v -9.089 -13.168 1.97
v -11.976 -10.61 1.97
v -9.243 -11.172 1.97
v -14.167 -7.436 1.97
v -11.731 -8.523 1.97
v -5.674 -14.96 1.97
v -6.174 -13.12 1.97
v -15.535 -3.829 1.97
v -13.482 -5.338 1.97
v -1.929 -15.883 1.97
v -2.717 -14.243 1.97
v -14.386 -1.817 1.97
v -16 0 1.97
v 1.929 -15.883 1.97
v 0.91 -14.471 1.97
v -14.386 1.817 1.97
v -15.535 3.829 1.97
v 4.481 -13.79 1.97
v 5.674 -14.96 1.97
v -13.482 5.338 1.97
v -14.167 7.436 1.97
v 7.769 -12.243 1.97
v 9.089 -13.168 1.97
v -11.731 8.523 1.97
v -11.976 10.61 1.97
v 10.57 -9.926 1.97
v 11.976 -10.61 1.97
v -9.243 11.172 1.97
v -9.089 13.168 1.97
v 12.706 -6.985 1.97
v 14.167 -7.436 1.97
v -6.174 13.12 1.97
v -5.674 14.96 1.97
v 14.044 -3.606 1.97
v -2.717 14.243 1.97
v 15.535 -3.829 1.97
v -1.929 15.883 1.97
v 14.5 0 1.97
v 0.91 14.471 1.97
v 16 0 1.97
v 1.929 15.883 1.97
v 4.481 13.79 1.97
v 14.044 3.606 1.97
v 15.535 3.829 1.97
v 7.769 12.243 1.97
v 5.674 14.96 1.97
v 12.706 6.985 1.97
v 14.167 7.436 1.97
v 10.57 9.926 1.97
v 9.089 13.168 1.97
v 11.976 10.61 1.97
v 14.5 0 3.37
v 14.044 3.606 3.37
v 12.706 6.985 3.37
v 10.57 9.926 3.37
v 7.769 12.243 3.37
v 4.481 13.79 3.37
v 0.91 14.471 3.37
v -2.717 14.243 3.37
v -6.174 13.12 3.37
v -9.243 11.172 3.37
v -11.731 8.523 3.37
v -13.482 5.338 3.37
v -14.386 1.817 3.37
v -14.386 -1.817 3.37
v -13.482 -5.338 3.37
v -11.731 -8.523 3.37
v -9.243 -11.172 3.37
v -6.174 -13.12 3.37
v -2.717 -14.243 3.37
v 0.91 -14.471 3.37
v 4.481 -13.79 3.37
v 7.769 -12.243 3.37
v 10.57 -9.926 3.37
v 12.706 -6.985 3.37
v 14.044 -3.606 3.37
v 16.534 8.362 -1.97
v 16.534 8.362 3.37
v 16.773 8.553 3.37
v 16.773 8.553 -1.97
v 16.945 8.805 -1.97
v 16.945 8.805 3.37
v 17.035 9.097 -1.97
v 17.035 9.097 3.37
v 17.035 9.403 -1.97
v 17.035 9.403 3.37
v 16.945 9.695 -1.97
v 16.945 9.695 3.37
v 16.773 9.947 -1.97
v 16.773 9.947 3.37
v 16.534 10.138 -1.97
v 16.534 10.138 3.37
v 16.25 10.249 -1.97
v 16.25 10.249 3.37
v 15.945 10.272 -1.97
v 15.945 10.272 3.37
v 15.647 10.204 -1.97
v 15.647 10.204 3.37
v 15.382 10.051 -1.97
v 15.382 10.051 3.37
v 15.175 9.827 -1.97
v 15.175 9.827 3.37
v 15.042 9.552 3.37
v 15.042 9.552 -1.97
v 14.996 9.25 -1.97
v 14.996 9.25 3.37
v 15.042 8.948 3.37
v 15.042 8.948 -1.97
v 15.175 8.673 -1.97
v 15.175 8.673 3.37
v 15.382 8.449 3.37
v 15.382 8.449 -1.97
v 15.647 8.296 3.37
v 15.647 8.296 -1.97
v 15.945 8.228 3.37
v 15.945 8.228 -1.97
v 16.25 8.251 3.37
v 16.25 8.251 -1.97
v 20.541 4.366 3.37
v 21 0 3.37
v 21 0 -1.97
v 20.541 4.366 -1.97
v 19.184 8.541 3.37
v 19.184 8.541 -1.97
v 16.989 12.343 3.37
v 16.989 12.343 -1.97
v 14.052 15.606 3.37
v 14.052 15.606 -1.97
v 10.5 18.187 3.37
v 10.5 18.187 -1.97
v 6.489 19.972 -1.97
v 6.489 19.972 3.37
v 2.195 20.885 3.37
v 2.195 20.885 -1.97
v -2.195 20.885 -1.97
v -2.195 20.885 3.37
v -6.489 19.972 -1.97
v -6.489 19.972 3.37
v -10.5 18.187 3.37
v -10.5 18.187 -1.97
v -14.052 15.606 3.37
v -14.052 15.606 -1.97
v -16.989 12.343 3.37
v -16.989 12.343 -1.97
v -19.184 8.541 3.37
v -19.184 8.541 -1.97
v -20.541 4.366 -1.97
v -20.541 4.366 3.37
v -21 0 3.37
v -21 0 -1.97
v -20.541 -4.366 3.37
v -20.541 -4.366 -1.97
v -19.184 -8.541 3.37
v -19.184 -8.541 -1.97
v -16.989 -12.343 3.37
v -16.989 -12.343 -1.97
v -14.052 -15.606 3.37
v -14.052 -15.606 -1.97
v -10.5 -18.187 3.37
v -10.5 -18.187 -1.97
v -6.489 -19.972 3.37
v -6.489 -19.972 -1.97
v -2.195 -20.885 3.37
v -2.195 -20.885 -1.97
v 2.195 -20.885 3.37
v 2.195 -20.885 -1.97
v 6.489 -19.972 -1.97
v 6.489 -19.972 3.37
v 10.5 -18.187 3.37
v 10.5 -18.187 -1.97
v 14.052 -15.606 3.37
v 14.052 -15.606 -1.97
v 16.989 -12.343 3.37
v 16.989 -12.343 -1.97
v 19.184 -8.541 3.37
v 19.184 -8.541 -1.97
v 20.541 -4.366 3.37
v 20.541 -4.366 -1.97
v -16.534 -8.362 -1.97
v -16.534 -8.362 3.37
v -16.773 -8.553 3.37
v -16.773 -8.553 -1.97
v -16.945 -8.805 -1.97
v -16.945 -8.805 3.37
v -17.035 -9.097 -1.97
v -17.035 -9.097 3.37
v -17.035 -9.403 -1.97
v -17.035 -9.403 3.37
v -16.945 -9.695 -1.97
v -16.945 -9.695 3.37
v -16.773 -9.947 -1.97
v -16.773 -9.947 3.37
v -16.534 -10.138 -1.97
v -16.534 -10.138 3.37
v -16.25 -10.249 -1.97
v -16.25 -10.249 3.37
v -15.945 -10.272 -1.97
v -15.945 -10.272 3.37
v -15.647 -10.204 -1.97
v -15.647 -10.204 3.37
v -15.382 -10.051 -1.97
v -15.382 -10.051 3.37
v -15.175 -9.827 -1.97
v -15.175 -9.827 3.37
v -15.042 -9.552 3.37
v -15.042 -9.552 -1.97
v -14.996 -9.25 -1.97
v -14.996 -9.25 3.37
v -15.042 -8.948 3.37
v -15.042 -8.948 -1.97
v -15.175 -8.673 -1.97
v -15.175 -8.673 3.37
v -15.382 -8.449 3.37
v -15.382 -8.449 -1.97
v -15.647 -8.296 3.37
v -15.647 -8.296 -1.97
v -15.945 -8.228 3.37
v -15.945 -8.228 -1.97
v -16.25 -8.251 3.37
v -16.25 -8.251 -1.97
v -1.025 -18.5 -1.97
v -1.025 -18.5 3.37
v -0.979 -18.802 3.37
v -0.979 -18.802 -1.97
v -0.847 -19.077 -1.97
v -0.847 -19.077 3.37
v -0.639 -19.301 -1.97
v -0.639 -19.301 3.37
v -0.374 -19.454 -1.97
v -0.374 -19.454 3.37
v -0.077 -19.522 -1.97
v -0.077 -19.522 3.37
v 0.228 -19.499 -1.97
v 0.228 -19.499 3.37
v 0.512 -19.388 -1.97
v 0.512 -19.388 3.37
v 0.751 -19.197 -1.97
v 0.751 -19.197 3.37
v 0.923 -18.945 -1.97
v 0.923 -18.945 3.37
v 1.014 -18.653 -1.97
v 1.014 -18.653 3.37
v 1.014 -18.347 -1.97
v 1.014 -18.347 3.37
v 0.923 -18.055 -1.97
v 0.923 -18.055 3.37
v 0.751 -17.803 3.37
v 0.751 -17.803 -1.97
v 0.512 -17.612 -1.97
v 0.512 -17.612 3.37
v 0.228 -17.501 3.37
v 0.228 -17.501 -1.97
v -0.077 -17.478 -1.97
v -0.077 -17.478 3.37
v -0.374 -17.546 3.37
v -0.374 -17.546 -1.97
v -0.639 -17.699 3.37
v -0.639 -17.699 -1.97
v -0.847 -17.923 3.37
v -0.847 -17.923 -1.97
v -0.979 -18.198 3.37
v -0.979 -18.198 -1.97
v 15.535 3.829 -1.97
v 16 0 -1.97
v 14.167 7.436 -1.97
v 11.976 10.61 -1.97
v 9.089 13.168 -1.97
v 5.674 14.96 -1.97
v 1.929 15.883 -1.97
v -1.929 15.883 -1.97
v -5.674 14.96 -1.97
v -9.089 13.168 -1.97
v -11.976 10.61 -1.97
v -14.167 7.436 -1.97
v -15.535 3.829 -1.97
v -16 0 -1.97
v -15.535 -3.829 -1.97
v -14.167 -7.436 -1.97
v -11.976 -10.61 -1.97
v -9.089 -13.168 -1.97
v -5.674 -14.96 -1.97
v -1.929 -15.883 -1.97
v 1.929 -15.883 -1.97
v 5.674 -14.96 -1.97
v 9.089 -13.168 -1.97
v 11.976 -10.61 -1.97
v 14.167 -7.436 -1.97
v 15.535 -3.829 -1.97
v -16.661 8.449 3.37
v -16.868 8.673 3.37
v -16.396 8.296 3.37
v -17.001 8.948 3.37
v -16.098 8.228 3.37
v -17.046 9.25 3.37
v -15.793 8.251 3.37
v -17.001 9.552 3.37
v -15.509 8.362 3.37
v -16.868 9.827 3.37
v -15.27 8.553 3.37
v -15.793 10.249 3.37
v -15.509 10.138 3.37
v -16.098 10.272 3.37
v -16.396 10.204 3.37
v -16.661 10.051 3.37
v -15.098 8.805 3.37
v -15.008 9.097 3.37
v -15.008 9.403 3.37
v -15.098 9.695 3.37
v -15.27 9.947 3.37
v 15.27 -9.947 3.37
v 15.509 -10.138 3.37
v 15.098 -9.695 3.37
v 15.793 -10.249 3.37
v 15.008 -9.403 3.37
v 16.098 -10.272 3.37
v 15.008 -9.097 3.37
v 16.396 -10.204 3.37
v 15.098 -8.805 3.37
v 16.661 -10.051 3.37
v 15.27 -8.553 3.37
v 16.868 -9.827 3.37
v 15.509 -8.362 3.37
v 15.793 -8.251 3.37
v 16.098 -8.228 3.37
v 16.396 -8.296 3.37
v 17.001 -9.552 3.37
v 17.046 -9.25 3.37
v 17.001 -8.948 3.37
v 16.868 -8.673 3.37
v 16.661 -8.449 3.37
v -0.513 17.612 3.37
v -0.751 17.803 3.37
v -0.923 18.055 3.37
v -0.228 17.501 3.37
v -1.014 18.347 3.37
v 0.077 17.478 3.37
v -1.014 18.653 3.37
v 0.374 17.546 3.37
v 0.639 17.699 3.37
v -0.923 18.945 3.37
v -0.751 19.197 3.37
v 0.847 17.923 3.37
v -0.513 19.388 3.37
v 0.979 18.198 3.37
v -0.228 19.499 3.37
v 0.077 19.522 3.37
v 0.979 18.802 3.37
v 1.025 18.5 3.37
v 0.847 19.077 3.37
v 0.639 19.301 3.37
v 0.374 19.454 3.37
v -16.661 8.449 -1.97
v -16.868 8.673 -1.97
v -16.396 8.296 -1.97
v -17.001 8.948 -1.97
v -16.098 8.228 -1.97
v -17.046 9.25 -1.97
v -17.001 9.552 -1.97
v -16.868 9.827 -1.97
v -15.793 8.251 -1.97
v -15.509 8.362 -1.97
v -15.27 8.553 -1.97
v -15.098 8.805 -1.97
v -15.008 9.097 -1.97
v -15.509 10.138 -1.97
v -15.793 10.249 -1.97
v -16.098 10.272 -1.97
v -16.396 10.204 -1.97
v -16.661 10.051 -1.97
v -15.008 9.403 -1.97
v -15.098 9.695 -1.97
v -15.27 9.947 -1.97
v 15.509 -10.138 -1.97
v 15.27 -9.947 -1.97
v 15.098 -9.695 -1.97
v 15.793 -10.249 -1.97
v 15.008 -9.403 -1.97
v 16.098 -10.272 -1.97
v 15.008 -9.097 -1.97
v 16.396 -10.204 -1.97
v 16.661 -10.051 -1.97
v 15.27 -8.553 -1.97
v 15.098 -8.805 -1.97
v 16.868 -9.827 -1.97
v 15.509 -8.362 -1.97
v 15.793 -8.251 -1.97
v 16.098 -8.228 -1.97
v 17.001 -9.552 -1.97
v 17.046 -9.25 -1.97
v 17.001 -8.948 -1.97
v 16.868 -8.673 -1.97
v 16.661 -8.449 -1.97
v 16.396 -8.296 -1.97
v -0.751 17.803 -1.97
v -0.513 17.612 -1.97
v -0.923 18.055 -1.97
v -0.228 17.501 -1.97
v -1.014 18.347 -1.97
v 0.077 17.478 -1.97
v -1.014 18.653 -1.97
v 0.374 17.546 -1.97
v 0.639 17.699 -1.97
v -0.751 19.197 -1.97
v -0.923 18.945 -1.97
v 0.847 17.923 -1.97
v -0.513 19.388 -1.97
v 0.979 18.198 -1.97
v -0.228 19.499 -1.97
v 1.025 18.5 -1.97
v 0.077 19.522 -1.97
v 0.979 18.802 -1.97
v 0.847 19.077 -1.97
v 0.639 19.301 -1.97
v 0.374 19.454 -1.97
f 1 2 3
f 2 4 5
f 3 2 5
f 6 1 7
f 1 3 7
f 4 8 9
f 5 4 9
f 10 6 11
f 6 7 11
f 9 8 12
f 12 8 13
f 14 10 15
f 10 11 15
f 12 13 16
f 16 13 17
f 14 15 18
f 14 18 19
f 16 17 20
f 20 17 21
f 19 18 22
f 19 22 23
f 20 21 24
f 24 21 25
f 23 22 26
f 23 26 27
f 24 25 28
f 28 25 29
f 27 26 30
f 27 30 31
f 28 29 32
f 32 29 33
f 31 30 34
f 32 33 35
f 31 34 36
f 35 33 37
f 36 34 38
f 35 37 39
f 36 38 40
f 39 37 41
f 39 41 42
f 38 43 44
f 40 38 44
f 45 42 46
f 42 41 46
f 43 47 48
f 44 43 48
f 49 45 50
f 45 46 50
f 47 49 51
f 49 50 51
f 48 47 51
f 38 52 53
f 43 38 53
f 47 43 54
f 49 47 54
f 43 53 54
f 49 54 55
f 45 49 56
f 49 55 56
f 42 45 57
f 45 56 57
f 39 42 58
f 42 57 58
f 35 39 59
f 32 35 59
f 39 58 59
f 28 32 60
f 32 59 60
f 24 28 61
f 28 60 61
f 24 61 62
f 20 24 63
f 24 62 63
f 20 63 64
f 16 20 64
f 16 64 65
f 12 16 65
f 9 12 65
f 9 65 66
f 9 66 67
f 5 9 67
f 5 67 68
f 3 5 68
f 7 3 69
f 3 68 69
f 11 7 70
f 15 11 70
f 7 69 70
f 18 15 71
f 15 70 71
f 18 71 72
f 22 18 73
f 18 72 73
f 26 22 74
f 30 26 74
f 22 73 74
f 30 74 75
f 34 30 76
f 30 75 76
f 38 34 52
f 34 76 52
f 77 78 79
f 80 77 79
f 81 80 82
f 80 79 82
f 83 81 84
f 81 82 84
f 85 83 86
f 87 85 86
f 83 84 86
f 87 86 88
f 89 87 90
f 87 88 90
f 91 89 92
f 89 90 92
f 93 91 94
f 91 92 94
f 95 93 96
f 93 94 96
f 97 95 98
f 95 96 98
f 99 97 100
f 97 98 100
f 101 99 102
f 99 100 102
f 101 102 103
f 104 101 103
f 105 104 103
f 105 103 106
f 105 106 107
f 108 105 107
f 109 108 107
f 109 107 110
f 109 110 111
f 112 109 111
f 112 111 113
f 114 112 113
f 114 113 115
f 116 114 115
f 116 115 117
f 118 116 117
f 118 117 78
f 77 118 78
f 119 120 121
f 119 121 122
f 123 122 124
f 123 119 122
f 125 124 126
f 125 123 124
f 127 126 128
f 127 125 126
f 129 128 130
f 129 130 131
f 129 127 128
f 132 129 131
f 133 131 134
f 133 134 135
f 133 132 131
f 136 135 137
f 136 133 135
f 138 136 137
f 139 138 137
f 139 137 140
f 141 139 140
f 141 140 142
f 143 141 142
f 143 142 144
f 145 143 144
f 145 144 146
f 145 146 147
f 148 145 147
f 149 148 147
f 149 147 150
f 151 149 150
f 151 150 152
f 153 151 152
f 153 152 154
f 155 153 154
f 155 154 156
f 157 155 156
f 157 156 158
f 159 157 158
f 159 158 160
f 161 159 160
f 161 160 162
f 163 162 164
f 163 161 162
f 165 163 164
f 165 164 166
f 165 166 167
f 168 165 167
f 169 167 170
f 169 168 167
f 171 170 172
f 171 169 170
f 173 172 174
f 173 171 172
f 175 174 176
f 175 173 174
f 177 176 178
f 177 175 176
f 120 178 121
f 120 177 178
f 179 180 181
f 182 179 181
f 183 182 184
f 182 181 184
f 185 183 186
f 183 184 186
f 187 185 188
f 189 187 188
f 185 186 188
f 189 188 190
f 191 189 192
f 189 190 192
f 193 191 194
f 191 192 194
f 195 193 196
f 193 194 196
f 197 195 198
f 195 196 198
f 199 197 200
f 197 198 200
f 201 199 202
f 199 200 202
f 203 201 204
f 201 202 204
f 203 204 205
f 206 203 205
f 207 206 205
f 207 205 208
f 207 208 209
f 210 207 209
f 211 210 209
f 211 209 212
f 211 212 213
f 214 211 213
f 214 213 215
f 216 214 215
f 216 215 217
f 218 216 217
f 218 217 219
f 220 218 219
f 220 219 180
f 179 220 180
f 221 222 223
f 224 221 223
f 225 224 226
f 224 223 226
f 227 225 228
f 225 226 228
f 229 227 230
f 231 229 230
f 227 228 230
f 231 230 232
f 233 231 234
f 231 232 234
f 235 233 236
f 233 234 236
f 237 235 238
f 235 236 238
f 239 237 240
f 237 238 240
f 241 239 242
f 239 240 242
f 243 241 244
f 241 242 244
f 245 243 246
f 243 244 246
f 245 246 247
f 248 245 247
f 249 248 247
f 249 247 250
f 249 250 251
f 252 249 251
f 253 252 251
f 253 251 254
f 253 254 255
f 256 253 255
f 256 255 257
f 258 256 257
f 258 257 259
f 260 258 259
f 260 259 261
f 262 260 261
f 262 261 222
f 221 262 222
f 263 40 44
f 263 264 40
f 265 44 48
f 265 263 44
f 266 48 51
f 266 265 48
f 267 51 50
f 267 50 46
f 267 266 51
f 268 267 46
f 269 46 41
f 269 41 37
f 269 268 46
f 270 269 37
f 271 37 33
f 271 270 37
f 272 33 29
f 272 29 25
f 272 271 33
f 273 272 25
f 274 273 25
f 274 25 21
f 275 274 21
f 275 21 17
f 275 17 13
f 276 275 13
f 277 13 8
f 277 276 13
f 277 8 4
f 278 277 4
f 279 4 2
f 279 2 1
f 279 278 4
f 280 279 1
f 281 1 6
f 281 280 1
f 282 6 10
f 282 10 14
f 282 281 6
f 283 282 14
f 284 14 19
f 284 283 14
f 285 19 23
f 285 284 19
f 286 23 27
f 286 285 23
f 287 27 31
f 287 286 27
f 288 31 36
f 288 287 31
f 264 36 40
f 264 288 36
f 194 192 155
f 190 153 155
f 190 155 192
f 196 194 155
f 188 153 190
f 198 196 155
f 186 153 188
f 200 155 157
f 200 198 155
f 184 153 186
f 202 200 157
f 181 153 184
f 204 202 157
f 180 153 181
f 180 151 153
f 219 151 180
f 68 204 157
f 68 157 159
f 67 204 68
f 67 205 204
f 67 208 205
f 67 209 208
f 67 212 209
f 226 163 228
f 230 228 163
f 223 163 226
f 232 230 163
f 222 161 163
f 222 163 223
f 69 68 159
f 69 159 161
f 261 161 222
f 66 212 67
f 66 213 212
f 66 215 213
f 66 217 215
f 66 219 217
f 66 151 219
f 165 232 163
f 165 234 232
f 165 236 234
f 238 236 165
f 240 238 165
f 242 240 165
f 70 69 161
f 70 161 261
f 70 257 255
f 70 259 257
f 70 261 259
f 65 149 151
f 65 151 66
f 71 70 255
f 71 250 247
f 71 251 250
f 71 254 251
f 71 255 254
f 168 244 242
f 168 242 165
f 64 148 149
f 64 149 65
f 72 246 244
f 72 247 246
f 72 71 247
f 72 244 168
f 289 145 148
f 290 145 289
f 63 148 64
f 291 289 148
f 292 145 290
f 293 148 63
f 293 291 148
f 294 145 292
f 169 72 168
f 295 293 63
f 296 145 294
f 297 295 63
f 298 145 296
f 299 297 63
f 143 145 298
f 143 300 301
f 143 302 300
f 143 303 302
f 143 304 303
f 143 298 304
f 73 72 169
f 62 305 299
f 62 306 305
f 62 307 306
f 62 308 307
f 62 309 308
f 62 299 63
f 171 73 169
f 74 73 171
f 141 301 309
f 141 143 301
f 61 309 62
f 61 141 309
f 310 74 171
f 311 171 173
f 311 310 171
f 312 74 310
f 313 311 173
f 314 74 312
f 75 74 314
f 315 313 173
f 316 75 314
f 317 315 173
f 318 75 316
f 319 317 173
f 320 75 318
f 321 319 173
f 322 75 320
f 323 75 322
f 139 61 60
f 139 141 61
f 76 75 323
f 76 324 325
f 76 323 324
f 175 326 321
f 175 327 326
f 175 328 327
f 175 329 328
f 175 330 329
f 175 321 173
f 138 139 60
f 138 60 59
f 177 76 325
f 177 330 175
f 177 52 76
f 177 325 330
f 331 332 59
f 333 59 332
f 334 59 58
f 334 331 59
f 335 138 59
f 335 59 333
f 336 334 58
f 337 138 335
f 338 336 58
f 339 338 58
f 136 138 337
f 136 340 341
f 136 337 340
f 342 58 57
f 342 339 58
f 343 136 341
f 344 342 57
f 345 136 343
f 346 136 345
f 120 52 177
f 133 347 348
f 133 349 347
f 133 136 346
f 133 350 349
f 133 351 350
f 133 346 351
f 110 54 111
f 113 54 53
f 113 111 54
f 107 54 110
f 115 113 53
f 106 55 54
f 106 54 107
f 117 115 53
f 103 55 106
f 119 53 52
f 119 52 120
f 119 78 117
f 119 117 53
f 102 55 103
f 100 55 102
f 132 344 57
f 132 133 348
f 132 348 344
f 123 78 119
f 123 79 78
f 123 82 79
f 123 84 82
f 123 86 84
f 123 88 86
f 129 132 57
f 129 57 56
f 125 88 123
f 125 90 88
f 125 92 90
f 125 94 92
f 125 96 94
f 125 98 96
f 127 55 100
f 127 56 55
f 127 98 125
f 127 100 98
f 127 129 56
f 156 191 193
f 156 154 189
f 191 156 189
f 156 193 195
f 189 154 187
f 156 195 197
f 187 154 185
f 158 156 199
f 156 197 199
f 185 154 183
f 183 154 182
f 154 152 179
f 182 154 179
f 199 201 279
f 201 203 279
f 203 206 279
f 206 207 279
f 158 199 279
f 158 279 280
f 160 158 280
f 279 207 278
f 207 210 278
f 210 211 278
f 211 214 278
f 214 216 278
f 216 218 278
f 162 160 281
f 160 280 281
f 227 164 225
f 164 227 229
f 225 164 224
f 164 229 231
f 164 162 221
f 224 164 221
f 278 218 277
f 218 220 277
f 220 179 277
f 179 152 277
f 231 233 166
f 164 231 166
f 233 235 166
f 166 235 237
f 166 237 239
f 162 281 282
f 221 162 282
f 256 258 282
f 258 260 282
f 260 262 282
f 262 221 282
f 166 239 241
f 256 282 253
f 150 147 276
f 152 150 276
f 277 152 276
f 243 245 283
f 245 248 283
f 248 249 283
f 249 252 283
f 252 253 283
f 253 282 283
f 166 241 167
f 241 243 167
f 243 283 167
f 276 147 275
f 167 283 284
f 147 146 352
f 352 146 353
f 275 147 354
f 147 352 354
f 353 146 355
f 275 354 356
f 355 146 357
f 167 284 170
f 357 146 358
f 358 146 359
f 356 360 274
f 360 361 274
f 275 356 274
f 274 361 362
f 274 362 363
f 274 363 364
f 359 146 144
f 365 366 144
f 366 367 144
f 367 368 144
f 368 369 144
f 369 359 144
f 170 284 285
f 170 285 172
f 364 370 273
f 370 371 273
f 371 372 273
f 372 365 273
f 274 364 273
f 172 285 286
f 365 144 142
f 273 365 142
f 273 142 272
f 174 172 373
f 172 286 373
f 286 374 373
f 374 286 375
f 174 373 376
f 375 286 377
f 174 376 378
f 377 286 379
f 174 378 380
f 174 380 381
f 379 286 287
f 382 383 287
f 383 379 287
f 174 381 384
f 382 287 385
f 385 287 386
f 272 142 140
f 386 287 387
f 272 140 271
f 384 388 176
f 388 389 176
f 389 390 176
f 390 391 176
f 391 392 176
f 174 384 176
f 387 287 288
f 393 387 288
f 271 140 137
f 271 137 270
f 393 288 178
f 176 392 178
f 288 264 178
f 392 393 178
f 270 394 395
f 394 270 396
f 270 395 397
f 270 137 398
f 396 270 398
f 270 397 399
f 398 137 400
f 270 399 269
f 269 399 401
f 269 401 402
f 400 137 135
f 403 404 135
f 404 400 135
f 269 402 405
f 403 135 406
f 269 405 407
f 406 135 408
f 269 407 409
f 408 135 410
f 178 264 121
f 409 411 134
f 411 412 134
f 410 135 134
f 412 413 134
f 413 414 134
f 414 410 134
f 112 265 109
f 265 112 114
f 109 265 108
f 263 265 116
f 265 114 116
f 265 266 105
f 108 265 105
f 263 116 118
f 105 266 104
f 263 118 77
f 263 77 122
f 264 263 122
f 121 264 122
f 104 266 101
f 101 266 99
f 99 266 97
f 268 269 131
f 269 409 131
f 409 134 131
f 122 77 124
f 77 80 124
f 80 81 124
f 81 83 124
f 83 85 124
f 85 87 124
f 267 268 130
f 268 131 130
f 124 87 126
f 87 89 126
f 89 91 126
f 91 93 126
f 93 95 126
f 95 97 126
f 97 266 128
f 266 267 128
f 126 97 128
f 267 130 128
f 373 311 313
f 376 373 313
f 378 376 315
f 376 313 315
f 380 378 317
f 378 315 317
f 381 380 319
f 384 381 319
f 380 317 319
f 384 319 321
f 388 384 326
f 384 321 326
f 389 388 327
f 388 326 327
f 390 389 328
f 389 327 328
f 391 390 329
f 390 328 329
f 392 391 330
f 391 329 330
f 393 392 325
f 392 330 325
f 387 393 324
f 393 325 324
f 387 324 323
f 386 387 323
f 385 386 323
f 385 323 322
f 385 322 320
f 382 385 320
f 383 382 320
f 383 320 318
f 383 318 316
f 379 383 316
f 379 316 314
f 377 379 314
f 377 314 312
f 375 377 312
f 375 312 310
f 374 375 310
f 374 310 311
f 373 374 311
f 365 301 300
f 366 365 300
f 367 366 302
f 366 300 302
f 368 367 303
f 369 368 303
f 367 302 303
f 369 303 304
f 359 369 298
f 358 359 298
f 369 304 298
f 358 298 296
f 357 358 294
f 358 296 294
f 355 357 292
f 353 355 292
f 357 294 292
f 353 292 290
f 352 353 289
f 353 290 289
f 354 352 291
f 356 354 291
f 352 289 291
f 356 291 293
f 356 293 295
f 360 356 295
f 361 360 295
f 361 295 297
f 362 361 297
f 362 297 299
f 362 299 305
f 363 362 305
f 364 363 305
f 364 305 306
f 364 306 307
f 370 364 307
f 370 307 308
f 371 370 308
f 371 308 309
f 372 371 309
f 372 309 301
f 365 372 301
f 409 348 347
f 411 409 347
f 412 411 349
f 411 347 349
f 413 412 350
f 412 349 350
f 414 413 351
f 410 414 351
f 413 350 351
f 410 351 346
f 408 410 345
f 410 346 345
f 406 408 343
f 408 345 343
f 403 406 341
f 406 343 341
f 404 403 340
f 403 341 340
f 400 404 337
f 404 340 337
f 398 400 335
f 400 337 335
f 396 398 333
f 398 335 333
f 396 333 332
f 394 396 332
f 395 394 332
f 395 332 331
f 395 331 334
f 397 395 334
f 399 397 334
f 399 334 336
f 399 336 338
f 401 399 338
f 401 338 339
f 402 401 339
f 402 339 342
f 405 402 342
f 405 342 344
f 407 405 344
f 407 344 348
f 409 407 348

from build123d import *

# Parameters (mm, degrees)
SKETCH_1_R               = 21
SKETCH_1_R_2             = 16
EXTRUDE_1_DEPTH          = 1.97
EXTRUDE_START            = 1.4
SKETCH_2_R               = 21
SKETCH_2_R_2             = 14.5
EXTRUDE_2_DEPTH          = 1.4
HOLE_WIZARD_M2_5_1_D     = 2.05
PATTERN_CIRCULAR_1_COUNT = 6


with BuildPart() as part:
    # 草图1 → 凸台-拉伸1 (new, symmetric)
    with BuildSketch(Plane.XY):
        Circle(SKETCH_1_R)
        Circle(SKETCH_1_R_2, mode=Mode.SUBTRACT)
    extrude(amount=EXTRUDE_1_DEPTH, both=True)

    # 草图2 → 凸台-拉伸2 (add)
    with BuildSketch(Plane.XY.offset(1.97).offset(EXTRUDE_START)):
        Circle(SKETCH_2_R)
        Circle(SKETCH_2_R_2, mode=Mode.SUBTRACT)
    extrude(amount=-EXTRUDE_2_DEPTH)

    # M2.5 螺纹孔1 (through all)
    with Locations(Plane(origin=(0, 0, -1.97), x_dir=(-1, 0, 0), z_dir=(0, 0, -1))):
        with Locations((0, 18.5)):
            hole_wizard_m2_5_1 = Hole(HOLE_WIZARD_M2_5_1_D / 2)

    # 阵列(圆周)1: M2.5 螺纹孔1 ×6 about axis
    pattern_circular_1_axis = Axis((0, 0, 0), (0, 0, 1))
    for i in range(1, PATTERN_CIRCULAR_1_COUNT):
        add(hole_wizard_m2_5_1.rotate(pattern_circular_1_axis, i * 360 / PATTERN_CIRCULAR_1_COUNT), mode=Mode.SUBTRACT)


solid = part.part
